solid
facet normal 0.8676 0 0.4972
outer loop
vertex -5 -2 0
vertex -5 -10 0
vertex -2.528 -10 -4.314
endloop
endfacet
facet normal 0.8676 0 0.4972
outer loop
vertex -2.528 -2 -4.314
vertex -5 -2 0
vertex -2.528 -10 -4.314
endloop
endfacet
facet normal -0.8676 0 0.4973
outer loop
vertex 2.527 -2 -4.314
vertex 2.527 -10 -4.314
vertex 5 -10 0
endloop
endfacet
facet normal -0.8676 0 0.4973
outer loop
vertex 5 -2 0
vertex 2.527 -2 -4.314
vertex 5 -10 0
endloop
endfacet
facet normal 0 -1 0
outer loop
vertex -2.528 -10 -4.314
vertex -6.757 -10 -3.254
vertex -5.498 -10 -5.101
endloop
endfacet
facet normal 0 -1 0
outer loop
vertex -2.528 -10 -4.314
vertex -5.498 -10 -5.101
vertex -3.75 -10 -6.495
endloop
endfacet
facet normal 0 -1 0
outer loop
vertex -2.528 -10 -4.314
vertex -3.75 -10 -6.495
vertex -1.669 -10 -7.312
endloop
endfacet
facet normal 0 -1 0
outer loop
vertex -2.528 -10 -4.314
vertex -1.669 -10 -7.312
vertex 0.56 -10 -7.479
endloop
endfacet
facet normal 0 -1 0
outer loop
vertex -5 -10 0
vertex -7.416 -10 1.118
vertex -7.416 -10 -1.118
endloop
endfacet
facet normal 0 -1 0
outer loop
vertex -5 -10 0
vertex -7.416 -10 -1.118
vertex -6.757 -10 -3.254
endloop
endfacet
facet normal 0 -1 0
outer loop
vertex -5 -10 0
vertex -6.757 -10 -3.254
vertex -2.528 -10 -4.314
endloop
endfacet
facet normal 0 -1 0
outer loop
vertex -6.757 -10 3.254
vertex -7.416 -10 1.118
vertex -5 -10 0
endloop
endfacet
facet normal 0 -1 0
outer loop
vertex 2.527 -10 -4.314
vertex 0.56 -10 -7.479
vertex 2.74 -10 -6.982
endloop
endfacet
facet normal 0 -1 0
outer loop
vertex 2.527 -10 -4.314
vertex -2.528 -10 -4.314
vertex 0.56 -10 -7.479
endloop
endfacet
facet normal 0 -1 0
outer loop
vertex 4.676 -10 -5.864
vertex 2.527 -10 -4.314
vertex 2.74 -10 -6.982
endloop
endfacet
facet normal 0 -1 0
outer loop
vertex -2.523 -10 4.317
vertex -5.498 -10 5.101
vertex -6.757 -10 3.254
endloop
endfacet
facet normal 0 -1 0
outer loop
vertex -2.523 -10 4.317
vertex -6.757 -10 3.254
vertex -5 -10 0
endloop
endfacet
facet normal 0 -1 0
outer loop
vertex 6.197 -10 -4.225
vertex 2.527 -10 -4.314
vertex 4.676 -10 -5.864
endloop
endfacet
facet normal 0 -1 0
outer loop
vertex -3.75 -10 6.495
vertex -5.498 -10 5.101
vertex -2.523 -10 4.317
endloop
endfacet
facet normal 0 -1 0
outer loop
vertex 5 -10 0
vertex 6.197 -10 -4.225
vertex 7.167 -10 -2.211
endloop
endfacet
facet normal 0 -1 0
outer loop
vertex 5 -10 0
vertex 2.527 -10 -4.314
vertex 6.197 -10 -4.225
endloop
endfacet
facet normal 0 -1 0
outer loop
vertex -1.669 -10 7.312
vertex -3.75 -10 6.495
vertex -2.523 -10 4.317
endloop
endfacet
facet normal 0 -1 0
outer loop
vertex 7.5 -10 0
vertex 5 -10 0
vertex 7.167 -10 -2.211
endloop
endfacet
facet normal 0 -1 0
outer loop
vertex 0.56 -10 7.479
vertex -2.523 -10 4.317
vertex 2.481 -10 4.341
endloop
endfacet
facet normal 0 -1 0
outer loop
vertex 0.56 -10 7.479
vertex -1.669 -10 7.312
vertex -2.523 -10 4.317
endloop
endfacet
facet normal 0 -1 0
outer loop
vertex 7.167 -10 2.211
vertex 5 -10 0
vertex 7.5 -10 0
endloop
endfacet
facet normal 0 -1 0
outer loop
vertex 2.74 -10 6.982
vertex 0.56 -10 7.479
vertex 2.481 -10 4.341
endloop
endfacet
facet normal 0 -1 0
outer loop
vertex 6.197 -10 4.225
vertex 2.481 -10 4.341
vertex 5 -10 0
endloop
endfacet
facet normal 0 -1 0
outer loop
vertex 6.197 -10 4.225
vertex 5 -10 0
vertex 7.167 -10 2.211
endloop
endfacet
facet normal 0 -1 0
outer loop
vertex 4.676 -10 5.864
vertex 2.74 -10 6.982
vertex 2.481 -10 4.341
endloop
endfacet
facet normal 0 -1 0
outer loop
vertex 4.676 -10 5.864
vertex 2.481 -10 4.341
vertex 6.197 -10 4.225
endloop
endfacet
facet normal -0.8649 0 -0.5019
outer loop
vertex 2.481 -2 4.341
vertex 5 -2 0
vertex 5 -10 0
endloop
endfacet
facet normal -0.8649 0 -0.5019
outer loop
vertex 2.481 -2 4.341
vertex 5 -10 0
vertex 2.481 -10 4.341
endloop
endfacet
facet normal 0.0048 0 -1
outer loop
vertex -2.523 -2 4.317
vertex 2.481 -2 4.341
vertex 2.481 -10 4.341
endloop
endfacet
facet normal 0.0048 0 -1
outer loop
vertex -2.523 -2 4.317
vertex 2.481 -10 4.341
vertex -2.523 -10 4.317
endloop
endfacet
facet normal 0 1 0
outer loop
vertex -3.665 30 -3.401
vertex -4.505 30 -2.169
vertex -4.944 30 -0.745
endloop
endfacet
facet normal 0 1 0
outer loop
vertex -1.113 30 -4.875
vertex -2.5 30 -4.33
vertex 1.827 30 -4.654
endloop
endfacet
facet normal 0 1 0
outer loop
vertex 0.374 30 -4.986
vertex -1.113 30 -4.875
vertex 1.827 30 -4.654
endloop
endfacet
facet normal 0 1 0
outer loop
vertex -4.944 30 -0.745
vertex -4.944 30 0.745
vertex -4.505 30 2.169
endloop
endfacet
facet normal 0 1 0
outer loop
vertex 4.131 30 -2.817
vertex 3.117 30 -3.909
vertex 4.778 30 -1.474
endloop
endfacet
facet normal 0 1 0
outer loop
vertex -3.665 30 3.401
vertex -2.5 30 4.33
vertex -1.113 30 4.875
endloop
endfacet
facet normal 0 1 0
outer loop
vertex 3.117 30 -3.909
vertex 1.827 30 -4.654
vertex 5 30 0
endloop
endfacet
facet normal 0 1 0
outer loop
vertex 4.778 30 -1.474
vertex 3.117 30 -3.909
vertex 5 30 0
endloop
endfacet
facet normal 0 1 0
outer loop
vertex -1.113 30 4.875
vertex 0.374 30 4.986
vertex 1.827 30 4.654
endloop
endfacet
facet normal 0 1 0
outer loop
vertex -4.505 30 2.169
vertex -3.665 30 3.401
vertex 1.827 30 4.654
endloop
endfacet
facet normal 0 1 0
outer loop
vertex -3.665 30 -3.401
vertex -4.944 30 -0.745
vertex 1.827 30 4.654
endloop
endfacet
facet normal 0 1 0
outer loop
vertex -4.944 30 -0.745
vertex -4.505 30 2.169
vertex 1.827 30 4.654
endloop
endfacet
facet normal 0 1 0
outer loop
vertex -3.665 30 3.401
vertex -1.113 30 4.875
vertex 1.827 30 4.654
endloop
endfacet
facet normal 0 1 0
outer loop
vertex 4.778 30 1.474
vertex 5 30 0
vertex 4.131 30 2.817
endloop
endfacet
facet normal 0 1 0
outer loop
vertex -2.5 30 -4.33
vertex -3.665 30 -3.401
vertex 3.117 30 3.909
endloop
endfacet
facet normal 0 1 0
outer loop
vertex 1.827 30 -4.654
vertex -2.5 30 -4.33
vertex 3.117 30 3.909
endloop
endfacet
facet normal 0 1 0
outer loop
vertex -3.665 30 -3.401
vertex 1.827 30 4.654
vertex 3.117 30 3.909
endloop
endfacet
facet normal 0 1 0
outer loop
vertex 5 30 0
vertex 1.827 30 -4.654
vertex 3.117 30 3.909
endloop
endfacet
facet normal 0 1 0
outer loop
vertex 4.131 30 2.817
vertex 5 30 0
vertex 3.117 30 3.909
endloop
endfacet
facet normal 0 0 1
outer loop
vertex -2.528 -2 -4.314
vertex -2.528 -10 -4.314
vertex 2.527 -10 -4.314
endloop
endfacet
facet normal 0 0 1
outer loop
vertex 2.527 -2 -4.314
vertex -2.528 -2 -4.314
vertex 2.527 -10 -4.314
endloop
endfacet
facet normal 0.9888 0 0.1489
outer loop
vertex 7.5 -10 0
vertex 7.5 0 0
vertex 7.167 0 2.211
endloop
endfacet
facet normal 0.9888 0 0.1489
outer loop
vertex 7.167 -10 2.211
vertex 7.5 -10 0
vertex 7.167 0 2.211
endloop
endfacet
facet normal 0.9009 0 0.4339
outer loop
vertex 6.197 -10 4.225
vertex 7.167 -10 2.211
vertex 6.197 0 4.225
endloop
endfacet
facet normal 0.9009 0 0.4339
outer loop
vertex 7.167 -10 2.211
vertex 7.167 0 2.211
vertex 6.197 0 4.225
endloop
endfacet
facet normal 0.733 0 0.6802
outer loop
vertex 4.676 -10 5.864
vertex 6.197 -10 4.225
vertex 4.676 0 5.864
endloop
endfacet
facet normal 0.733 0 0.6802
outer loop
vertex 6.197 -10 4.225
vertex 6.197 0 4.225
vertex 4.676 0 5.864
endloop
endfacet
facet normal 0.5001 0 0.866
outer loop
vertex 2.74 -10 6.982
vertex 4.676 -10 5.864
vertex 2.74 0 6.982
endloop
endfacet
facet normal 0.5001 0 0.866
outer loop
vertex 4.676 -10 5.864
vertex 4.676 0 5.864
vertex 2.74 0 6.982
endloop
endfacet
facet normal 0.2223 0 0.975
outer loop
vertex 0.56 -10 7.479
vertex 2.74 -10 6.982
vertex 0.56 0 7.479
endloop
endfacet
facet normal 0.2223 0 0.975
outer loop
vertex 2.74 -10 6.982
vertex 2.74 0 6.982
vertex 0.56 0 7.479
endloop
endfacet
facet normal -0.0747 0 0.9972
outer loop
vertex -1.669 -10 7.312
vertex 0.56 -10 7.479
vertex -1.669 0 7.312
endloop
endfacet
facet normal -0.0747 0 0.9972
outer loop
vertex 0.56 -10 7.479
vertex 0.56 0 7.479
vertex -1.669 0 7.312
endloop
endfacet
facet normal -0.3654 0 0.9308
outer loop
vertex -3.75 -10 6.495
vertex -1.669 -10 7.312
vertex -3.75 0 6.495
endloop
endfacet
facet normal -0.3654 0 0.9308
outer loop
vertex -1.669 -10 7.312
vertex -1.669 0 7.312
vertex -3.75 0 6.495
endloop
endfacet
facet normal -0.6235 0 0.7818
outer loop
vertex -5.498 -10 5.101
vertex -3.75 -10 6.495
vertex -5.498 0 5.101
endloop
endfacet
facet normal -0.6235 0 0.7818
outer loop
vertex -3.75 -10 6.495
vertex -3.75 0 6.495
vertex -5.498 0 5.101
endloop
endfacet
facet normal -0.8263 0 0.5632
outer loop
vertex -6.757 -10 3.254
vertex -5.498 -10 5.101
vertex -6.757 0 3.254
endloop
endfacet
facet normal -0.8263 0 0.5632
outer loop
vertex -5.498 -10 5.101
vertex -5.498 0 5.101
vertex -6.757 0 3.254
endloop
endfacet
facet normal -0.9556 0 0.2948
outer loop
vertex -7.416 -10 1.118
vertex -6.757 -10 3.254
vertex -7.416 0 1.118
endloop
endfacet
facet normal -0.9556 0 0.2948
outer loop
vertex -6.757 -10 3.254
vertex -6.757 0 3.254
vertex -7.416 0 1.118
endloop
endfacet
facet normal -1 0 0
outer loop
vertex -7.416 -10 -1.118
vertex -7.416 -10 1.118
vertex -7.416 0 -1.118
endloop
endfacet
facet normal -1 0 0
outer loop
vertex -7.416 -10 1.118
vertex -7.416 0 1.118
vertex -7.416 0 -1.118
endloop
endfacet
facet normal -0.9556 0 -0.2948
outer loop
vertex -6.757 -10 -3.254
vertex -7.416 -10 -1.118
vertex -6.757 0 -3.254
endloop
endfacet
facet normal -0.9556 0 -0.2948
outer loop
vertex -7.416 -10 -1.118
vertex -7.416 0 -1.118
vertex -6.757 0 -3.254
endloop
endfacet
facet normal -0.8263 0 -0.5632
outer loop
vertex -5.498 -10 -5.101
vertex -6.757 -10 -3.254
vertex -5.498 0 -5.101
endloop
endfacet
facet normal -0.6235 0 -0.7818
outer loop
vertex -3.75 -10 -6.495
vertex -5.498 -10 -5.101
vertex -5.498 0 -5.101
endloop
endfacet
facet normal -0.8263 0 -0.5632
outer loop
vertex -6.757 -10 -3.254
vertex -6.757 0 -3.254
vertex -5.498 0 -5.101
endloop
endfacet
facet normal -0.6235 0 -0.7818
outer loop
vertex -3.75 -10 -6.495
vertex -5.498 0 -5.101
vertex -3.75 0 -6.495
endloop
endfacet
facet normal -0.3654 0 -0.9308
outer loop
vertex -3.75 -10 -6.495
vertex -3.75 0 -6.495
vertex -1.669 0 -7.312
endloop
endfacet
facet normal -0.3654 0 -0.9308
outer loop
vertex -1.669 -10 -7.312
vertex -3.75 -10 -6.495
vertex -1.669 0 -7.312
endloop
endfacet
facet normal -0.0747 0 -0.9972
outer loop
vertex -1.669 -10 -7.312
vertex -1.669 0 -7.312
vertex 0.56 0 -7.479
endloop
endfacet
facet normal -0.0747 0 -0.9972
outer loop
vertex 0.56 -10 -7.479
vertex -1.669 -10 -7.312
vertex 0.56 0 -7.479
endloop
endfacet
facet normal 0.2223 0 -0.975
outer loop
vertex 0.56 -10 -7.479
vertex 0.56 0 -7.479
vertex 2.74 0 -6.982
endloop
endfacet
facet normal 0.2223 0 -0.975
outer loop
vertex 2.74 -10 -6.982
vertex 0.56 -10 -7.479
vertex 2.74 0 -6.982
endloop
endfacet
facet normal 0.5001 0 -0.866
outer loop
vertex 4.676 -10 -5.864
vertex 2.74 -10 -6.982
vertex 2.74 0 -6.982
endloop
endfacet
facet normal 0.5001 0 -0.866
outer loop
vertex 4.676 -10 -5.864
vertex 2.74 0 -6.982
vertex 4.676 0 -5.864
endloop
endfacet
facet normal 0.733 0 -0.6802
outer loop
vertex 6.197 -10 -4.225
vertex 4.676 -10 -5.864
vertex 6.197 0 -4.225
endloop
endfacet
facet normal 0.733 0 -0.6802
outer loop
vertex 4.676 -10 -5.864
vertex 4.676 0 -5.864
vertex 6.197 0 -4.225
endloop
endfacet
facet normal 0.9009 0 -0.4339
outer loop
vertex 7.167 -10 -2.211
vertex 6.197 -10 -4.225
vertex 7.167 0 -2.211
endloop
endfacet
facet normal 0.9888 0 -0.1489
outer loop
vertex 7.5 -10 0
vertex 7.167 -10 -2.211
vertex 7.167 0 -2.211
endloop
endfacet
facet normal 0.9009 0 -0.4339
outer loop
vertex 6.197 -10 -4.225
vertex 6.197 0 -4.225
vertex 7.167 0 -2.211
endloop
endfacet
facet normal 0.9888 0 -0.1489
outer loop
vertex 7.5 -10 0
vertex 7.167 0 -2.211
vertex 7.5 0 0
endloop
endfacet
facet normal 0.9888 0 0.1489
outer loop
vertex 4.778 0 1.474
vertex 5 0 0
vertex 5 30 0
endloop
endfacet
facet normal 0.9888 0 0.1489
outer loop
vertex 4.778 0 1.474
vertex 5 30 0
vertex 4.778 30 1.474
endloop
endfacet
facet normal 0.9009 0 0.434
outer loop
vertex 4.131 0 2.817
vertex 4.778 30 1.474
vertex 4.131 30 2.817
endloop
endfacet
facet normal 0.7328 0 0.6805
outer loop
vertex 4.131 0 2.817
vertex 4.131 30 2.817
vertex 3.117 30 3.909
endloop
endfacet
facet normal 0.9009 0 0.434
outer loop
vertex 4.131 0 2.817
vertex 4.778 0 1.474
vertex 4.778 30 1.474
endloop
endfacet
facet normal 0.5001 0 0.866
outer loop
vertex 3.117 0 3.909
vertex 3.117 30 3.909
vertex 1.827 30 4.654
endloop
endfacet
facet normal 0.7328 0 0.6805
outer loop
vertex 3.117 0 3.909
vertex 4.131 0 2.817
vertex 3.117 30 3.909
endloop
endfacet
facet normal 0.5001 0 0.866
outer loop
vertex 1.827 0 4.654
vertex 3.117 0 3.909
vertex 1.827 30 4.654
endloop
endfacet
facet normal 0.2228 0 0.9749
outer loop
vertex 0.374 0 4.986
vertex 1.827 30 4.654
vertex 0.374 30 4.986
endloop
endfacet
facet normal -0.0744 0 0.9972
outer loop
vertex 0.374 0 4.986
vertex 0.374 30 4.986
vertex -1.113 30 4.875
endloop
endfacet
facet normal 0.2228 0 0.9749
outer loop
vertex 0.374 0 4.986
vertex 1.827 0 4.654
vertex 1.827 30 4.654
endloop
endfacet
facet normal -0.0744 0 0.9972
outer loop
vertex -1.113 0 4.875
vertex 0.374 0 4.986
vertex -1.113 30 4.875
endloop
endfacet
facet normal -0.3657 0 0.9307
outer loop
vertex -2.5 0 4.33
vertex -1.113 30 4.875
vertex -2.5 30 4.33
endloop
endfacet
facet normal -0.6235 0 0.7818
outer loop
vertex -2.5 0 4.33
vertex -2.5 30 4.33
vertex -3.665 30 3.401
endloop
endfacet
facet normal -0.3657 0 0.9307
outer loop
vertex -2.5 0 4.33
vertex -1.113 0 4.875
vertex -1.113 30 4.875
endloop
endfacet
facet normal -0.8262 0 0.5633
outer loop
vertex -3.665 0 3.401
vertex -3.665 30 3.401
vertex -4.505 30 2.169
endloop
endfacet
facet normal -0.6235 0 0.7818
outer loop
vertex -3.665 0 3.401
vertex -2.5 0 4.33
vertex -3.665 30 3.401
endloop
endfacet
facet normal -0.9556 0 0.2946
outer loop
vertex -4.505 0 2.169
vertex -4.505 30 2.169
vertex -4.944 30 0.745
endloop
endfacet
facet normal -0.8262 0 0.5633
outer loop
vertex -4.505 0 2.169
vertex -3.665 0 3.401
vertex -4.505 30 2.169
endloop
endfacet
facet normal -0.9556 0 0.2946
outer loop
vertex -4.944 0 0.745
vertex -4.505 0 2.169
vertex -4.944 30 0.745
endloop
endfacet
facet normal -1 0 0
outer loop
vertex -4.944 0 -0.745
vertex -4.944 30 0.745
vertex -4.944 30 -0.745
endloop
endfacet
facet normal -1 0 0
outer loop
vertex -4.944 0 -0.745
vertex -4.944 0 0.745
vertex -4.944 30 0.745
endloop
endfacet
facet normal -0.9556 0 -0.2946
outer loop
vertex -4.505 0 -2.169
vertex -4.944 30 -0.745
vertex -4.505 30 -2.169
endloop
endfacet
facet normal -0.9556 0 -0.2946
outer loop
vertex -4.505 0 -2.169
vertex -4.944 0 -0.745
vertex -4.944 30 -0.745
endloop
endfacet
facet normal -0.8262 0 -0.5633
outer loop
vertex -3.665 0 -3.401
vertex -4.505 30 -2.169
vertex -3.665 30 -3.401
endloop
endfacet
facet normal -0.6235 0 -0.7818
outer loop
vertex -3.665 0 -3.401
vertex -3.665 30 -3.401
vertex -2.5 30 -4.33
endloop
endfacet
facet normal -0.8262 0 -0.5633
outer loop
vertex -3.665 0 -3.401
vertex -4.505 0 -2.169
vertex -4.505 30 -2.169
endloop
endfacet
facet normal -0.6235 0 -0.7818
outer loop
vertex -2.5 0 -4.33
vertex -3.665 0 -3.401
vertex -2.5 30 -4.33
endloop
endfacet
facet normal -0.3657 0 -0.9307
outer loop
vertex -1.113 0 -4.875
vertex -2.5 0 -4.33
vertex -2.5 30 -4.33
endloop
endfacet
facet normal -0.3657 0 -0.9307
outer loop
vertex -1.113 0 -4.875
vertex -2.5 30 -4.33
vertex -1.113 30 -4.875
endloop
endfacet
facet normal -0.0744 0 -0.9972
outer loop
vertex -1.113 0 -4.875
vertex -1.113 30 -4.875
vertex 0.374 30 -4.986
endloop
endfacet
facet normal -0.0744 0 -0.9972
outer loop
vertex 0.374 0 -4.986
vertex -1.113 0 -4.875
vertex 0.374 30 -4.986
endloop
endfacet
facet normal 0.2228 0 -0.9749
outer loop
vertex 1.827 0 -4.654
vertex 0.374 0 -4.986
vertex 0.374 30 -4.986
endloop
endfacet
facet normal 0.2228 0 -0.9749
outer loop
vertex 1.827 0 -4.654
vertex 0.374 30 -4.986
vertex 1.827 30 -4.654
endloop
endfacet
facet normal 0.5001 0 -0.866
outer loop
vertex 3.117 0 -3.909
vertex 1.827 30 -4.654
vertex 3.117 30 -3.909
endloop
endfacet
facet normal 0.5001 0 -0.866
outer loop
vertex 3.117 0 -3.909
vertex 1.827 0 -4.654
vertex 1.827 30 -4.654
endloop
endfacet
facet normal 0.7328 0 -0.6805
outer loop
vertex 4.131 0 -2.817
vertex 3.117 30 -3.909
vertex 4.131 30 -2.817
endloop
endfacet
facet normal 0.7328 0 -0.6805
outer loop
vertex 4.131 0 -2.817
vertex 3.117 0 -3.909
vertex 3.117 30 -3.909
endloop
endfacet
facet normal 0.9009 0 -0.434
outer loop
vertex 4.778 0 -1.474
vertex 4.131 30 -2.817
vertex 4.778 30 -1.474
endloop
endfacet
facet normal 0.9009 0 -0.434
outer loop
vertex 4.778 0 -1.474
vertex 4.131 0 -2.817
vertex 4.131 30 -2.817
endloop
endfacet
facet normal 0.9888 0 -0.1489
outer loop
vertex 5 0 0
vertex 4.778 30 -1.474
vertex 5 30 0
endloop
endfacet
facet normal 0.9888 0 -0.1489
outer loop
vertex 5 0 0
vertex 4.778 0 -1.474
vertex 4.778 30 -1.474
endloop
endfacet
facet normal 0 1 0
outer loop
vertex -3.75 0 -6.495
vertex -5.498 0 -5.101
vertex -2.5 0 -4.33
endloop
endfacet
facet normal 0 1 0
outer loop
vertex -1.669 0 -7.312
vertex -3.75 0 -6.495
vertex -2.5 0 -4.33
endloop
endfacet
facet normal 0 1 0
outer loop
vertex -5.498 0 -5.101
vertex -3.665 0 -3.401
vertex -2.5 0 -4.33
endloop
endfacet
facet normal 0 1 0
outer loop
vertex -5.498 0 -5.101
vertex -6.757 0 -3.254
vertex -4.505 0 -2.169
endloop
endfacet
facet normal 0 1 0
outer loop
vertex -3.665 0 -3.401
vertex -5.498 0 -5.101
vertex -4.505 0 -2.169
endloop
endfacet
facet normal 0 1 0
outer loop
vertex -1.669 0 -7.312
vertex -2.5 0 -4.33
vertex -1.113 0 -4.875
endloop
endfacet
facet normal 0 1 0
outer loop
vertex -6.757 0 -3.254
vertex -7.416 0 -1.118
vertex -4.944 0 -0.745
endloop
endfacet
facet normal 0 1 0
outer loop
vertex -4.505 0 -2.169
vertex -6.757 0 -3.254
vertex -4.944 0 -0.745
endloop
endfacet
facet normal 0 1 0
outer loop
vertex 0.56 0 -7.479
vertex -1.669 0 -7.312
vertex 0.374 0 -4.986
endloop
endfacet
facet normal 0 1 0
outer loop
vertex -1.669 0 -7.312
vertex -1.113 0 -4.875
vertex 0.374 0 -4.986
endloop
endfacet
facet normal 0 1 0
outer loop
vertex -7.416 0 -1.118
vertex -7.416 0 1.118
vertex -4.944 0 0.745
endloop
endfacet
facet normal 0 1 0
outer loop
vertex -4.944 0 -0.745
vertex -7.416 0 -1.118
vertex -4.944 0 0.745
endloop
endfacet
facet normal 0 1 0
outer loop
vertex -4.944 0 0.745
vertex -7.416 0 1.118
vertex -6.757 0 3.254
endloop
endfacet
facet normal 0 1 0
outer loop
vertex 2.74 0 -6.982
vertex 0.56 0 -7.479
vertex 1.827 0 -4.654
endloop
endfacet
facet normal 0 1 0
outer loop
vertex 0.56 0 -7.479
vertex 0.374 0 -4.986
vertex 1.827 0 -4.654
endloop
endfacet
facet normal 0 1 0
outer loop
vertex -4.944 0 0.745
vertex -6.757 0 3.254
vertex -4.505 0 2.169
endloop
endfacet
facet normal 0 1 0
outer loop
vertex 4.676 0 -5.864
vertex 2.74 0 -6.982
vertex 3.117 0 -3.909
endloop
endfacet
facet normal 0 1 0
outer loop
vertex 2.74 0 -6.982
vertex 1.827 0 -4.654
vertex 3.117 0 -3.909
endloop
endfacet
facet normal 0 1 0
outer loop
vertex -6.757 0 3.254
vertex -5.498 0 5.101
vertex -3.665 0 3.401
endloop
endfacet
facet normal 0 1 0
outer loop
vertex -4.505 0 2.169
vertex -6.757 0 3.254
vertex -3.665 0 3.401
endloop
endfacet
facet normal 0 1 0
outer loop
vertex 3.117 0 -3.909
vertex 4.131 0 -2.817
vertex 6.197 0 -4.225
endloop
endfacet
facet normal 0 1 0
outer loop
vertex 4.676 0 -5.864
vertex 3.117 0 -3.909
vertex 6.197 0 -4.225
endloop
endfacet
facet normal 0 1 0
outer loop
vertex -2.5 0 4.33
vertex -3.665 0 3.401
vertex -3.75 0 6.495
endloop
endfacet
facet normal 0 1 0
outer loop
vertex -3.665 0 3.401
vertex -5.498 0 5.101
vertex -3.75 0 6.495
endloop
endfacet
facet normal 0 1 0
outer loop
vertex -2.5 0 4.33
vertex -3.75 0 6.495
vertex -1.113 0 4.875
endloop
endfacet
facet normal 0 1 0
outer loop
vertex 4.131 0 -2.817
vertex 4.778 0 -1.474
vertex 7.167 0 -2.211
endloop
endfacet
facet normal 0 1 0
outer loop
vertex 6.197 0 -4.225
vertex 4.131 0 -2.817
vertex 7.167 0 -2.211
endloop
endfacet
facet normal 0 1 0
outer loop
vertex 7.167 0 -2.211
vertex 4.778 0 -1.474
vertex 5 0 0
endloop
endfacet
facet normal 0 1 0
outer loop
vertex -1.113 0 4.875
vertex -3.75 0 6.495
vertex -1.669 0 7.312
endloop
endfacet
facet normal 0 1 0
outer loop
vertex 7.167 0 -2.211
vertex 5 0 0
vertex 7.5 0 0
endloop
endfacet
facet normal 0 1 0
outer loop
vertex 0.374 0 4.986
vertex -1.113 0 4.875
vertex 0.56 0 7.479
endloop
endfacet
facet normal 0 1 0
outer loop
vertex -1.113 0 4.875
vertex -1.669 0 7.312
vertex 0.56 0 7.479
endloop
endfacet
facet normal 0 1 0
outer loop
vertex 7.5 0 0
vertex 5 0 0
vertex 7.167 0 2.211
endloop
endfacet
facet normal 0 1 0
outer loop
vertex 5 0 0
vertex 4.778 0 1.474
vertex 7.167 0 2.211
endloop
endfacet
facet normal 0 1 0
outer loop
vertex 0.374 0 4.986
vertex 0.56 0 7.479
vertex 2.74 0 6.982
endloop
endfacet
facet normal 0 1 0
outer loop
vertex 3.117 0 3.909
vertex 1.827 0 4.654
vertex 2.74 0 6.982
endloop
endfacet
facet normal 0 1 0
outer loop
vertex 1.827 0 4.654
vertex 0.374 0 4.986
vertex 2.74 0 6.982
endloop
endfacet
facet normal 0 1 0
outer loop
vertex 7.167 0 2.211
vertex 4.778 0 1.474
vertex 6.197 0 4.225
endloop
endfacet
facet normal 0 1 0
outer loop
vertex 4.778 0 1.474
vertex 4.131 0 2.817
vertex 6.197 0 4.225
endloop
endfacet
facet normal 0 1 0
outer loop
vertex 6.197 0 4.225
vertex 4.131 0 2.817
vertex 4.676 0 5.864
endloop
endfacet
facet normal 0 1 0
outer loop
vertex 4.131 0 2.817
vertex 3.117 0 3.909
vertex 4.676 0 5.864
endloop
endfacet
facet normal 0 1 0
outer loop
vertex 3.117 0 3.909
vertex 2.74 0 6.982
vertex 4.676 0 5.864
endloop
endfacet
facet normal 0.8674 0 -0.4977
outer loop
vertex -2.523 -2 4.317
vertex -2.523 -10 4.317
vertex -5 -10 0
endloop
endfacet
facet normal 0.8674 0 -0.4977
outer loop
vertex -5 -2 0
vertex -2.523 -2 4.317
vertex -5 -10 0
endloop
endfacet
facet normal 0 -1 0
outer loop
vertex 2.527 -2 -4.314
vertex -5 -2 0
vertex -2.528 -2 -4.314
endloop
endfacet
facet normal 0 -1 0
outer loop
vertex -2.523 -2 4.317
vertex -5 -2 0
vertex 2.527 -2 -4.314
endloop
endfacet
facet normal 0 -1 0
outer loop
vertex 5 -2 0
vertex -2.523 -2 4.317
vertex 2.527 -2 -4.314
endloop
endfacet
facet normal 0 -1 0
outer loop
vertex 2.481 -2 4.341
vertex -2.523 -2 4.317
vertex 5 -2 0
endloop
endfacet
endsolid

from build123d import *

# Parameters (mm, degrees)
F0_R     = 5
F1_DEPTH = 30
F3_R     = 7.5
F4_DEPTH = 10
F7_DEPTH = 8


# Not quite as in the source:
# - a feature names something its author has since deleted; it is built from what else it names


with BuildPart() as f1:
    # F0 (on Front) → F1 (new body)
    with BuildSketch(Plane.XZ):
        Circle(F0_R)
    extrude(amount=-F1_DEPTH)

    # F3 (on offset) → F4 (join)
    with BuildSketch(Plane.XZ):
        Circle(F3_R)
    extrude(amount=F4_DEPTH)

    # F6 (on offset) → F7 (cut)
    with BuildSketch(Plane.XZ.offset(10)):
        Polygon((5, 0), (2.4813610619, 4.3408348599), (-2.5225813199, 4.3170109433), (-5, 0), (-2.5277935483, -4.313961031), (2.5273847237, -4.3142005584), align=None)
    extrude(amount=-F7_DEPTH, mode=Mode.SUBTRACT)


solid = f1.part
